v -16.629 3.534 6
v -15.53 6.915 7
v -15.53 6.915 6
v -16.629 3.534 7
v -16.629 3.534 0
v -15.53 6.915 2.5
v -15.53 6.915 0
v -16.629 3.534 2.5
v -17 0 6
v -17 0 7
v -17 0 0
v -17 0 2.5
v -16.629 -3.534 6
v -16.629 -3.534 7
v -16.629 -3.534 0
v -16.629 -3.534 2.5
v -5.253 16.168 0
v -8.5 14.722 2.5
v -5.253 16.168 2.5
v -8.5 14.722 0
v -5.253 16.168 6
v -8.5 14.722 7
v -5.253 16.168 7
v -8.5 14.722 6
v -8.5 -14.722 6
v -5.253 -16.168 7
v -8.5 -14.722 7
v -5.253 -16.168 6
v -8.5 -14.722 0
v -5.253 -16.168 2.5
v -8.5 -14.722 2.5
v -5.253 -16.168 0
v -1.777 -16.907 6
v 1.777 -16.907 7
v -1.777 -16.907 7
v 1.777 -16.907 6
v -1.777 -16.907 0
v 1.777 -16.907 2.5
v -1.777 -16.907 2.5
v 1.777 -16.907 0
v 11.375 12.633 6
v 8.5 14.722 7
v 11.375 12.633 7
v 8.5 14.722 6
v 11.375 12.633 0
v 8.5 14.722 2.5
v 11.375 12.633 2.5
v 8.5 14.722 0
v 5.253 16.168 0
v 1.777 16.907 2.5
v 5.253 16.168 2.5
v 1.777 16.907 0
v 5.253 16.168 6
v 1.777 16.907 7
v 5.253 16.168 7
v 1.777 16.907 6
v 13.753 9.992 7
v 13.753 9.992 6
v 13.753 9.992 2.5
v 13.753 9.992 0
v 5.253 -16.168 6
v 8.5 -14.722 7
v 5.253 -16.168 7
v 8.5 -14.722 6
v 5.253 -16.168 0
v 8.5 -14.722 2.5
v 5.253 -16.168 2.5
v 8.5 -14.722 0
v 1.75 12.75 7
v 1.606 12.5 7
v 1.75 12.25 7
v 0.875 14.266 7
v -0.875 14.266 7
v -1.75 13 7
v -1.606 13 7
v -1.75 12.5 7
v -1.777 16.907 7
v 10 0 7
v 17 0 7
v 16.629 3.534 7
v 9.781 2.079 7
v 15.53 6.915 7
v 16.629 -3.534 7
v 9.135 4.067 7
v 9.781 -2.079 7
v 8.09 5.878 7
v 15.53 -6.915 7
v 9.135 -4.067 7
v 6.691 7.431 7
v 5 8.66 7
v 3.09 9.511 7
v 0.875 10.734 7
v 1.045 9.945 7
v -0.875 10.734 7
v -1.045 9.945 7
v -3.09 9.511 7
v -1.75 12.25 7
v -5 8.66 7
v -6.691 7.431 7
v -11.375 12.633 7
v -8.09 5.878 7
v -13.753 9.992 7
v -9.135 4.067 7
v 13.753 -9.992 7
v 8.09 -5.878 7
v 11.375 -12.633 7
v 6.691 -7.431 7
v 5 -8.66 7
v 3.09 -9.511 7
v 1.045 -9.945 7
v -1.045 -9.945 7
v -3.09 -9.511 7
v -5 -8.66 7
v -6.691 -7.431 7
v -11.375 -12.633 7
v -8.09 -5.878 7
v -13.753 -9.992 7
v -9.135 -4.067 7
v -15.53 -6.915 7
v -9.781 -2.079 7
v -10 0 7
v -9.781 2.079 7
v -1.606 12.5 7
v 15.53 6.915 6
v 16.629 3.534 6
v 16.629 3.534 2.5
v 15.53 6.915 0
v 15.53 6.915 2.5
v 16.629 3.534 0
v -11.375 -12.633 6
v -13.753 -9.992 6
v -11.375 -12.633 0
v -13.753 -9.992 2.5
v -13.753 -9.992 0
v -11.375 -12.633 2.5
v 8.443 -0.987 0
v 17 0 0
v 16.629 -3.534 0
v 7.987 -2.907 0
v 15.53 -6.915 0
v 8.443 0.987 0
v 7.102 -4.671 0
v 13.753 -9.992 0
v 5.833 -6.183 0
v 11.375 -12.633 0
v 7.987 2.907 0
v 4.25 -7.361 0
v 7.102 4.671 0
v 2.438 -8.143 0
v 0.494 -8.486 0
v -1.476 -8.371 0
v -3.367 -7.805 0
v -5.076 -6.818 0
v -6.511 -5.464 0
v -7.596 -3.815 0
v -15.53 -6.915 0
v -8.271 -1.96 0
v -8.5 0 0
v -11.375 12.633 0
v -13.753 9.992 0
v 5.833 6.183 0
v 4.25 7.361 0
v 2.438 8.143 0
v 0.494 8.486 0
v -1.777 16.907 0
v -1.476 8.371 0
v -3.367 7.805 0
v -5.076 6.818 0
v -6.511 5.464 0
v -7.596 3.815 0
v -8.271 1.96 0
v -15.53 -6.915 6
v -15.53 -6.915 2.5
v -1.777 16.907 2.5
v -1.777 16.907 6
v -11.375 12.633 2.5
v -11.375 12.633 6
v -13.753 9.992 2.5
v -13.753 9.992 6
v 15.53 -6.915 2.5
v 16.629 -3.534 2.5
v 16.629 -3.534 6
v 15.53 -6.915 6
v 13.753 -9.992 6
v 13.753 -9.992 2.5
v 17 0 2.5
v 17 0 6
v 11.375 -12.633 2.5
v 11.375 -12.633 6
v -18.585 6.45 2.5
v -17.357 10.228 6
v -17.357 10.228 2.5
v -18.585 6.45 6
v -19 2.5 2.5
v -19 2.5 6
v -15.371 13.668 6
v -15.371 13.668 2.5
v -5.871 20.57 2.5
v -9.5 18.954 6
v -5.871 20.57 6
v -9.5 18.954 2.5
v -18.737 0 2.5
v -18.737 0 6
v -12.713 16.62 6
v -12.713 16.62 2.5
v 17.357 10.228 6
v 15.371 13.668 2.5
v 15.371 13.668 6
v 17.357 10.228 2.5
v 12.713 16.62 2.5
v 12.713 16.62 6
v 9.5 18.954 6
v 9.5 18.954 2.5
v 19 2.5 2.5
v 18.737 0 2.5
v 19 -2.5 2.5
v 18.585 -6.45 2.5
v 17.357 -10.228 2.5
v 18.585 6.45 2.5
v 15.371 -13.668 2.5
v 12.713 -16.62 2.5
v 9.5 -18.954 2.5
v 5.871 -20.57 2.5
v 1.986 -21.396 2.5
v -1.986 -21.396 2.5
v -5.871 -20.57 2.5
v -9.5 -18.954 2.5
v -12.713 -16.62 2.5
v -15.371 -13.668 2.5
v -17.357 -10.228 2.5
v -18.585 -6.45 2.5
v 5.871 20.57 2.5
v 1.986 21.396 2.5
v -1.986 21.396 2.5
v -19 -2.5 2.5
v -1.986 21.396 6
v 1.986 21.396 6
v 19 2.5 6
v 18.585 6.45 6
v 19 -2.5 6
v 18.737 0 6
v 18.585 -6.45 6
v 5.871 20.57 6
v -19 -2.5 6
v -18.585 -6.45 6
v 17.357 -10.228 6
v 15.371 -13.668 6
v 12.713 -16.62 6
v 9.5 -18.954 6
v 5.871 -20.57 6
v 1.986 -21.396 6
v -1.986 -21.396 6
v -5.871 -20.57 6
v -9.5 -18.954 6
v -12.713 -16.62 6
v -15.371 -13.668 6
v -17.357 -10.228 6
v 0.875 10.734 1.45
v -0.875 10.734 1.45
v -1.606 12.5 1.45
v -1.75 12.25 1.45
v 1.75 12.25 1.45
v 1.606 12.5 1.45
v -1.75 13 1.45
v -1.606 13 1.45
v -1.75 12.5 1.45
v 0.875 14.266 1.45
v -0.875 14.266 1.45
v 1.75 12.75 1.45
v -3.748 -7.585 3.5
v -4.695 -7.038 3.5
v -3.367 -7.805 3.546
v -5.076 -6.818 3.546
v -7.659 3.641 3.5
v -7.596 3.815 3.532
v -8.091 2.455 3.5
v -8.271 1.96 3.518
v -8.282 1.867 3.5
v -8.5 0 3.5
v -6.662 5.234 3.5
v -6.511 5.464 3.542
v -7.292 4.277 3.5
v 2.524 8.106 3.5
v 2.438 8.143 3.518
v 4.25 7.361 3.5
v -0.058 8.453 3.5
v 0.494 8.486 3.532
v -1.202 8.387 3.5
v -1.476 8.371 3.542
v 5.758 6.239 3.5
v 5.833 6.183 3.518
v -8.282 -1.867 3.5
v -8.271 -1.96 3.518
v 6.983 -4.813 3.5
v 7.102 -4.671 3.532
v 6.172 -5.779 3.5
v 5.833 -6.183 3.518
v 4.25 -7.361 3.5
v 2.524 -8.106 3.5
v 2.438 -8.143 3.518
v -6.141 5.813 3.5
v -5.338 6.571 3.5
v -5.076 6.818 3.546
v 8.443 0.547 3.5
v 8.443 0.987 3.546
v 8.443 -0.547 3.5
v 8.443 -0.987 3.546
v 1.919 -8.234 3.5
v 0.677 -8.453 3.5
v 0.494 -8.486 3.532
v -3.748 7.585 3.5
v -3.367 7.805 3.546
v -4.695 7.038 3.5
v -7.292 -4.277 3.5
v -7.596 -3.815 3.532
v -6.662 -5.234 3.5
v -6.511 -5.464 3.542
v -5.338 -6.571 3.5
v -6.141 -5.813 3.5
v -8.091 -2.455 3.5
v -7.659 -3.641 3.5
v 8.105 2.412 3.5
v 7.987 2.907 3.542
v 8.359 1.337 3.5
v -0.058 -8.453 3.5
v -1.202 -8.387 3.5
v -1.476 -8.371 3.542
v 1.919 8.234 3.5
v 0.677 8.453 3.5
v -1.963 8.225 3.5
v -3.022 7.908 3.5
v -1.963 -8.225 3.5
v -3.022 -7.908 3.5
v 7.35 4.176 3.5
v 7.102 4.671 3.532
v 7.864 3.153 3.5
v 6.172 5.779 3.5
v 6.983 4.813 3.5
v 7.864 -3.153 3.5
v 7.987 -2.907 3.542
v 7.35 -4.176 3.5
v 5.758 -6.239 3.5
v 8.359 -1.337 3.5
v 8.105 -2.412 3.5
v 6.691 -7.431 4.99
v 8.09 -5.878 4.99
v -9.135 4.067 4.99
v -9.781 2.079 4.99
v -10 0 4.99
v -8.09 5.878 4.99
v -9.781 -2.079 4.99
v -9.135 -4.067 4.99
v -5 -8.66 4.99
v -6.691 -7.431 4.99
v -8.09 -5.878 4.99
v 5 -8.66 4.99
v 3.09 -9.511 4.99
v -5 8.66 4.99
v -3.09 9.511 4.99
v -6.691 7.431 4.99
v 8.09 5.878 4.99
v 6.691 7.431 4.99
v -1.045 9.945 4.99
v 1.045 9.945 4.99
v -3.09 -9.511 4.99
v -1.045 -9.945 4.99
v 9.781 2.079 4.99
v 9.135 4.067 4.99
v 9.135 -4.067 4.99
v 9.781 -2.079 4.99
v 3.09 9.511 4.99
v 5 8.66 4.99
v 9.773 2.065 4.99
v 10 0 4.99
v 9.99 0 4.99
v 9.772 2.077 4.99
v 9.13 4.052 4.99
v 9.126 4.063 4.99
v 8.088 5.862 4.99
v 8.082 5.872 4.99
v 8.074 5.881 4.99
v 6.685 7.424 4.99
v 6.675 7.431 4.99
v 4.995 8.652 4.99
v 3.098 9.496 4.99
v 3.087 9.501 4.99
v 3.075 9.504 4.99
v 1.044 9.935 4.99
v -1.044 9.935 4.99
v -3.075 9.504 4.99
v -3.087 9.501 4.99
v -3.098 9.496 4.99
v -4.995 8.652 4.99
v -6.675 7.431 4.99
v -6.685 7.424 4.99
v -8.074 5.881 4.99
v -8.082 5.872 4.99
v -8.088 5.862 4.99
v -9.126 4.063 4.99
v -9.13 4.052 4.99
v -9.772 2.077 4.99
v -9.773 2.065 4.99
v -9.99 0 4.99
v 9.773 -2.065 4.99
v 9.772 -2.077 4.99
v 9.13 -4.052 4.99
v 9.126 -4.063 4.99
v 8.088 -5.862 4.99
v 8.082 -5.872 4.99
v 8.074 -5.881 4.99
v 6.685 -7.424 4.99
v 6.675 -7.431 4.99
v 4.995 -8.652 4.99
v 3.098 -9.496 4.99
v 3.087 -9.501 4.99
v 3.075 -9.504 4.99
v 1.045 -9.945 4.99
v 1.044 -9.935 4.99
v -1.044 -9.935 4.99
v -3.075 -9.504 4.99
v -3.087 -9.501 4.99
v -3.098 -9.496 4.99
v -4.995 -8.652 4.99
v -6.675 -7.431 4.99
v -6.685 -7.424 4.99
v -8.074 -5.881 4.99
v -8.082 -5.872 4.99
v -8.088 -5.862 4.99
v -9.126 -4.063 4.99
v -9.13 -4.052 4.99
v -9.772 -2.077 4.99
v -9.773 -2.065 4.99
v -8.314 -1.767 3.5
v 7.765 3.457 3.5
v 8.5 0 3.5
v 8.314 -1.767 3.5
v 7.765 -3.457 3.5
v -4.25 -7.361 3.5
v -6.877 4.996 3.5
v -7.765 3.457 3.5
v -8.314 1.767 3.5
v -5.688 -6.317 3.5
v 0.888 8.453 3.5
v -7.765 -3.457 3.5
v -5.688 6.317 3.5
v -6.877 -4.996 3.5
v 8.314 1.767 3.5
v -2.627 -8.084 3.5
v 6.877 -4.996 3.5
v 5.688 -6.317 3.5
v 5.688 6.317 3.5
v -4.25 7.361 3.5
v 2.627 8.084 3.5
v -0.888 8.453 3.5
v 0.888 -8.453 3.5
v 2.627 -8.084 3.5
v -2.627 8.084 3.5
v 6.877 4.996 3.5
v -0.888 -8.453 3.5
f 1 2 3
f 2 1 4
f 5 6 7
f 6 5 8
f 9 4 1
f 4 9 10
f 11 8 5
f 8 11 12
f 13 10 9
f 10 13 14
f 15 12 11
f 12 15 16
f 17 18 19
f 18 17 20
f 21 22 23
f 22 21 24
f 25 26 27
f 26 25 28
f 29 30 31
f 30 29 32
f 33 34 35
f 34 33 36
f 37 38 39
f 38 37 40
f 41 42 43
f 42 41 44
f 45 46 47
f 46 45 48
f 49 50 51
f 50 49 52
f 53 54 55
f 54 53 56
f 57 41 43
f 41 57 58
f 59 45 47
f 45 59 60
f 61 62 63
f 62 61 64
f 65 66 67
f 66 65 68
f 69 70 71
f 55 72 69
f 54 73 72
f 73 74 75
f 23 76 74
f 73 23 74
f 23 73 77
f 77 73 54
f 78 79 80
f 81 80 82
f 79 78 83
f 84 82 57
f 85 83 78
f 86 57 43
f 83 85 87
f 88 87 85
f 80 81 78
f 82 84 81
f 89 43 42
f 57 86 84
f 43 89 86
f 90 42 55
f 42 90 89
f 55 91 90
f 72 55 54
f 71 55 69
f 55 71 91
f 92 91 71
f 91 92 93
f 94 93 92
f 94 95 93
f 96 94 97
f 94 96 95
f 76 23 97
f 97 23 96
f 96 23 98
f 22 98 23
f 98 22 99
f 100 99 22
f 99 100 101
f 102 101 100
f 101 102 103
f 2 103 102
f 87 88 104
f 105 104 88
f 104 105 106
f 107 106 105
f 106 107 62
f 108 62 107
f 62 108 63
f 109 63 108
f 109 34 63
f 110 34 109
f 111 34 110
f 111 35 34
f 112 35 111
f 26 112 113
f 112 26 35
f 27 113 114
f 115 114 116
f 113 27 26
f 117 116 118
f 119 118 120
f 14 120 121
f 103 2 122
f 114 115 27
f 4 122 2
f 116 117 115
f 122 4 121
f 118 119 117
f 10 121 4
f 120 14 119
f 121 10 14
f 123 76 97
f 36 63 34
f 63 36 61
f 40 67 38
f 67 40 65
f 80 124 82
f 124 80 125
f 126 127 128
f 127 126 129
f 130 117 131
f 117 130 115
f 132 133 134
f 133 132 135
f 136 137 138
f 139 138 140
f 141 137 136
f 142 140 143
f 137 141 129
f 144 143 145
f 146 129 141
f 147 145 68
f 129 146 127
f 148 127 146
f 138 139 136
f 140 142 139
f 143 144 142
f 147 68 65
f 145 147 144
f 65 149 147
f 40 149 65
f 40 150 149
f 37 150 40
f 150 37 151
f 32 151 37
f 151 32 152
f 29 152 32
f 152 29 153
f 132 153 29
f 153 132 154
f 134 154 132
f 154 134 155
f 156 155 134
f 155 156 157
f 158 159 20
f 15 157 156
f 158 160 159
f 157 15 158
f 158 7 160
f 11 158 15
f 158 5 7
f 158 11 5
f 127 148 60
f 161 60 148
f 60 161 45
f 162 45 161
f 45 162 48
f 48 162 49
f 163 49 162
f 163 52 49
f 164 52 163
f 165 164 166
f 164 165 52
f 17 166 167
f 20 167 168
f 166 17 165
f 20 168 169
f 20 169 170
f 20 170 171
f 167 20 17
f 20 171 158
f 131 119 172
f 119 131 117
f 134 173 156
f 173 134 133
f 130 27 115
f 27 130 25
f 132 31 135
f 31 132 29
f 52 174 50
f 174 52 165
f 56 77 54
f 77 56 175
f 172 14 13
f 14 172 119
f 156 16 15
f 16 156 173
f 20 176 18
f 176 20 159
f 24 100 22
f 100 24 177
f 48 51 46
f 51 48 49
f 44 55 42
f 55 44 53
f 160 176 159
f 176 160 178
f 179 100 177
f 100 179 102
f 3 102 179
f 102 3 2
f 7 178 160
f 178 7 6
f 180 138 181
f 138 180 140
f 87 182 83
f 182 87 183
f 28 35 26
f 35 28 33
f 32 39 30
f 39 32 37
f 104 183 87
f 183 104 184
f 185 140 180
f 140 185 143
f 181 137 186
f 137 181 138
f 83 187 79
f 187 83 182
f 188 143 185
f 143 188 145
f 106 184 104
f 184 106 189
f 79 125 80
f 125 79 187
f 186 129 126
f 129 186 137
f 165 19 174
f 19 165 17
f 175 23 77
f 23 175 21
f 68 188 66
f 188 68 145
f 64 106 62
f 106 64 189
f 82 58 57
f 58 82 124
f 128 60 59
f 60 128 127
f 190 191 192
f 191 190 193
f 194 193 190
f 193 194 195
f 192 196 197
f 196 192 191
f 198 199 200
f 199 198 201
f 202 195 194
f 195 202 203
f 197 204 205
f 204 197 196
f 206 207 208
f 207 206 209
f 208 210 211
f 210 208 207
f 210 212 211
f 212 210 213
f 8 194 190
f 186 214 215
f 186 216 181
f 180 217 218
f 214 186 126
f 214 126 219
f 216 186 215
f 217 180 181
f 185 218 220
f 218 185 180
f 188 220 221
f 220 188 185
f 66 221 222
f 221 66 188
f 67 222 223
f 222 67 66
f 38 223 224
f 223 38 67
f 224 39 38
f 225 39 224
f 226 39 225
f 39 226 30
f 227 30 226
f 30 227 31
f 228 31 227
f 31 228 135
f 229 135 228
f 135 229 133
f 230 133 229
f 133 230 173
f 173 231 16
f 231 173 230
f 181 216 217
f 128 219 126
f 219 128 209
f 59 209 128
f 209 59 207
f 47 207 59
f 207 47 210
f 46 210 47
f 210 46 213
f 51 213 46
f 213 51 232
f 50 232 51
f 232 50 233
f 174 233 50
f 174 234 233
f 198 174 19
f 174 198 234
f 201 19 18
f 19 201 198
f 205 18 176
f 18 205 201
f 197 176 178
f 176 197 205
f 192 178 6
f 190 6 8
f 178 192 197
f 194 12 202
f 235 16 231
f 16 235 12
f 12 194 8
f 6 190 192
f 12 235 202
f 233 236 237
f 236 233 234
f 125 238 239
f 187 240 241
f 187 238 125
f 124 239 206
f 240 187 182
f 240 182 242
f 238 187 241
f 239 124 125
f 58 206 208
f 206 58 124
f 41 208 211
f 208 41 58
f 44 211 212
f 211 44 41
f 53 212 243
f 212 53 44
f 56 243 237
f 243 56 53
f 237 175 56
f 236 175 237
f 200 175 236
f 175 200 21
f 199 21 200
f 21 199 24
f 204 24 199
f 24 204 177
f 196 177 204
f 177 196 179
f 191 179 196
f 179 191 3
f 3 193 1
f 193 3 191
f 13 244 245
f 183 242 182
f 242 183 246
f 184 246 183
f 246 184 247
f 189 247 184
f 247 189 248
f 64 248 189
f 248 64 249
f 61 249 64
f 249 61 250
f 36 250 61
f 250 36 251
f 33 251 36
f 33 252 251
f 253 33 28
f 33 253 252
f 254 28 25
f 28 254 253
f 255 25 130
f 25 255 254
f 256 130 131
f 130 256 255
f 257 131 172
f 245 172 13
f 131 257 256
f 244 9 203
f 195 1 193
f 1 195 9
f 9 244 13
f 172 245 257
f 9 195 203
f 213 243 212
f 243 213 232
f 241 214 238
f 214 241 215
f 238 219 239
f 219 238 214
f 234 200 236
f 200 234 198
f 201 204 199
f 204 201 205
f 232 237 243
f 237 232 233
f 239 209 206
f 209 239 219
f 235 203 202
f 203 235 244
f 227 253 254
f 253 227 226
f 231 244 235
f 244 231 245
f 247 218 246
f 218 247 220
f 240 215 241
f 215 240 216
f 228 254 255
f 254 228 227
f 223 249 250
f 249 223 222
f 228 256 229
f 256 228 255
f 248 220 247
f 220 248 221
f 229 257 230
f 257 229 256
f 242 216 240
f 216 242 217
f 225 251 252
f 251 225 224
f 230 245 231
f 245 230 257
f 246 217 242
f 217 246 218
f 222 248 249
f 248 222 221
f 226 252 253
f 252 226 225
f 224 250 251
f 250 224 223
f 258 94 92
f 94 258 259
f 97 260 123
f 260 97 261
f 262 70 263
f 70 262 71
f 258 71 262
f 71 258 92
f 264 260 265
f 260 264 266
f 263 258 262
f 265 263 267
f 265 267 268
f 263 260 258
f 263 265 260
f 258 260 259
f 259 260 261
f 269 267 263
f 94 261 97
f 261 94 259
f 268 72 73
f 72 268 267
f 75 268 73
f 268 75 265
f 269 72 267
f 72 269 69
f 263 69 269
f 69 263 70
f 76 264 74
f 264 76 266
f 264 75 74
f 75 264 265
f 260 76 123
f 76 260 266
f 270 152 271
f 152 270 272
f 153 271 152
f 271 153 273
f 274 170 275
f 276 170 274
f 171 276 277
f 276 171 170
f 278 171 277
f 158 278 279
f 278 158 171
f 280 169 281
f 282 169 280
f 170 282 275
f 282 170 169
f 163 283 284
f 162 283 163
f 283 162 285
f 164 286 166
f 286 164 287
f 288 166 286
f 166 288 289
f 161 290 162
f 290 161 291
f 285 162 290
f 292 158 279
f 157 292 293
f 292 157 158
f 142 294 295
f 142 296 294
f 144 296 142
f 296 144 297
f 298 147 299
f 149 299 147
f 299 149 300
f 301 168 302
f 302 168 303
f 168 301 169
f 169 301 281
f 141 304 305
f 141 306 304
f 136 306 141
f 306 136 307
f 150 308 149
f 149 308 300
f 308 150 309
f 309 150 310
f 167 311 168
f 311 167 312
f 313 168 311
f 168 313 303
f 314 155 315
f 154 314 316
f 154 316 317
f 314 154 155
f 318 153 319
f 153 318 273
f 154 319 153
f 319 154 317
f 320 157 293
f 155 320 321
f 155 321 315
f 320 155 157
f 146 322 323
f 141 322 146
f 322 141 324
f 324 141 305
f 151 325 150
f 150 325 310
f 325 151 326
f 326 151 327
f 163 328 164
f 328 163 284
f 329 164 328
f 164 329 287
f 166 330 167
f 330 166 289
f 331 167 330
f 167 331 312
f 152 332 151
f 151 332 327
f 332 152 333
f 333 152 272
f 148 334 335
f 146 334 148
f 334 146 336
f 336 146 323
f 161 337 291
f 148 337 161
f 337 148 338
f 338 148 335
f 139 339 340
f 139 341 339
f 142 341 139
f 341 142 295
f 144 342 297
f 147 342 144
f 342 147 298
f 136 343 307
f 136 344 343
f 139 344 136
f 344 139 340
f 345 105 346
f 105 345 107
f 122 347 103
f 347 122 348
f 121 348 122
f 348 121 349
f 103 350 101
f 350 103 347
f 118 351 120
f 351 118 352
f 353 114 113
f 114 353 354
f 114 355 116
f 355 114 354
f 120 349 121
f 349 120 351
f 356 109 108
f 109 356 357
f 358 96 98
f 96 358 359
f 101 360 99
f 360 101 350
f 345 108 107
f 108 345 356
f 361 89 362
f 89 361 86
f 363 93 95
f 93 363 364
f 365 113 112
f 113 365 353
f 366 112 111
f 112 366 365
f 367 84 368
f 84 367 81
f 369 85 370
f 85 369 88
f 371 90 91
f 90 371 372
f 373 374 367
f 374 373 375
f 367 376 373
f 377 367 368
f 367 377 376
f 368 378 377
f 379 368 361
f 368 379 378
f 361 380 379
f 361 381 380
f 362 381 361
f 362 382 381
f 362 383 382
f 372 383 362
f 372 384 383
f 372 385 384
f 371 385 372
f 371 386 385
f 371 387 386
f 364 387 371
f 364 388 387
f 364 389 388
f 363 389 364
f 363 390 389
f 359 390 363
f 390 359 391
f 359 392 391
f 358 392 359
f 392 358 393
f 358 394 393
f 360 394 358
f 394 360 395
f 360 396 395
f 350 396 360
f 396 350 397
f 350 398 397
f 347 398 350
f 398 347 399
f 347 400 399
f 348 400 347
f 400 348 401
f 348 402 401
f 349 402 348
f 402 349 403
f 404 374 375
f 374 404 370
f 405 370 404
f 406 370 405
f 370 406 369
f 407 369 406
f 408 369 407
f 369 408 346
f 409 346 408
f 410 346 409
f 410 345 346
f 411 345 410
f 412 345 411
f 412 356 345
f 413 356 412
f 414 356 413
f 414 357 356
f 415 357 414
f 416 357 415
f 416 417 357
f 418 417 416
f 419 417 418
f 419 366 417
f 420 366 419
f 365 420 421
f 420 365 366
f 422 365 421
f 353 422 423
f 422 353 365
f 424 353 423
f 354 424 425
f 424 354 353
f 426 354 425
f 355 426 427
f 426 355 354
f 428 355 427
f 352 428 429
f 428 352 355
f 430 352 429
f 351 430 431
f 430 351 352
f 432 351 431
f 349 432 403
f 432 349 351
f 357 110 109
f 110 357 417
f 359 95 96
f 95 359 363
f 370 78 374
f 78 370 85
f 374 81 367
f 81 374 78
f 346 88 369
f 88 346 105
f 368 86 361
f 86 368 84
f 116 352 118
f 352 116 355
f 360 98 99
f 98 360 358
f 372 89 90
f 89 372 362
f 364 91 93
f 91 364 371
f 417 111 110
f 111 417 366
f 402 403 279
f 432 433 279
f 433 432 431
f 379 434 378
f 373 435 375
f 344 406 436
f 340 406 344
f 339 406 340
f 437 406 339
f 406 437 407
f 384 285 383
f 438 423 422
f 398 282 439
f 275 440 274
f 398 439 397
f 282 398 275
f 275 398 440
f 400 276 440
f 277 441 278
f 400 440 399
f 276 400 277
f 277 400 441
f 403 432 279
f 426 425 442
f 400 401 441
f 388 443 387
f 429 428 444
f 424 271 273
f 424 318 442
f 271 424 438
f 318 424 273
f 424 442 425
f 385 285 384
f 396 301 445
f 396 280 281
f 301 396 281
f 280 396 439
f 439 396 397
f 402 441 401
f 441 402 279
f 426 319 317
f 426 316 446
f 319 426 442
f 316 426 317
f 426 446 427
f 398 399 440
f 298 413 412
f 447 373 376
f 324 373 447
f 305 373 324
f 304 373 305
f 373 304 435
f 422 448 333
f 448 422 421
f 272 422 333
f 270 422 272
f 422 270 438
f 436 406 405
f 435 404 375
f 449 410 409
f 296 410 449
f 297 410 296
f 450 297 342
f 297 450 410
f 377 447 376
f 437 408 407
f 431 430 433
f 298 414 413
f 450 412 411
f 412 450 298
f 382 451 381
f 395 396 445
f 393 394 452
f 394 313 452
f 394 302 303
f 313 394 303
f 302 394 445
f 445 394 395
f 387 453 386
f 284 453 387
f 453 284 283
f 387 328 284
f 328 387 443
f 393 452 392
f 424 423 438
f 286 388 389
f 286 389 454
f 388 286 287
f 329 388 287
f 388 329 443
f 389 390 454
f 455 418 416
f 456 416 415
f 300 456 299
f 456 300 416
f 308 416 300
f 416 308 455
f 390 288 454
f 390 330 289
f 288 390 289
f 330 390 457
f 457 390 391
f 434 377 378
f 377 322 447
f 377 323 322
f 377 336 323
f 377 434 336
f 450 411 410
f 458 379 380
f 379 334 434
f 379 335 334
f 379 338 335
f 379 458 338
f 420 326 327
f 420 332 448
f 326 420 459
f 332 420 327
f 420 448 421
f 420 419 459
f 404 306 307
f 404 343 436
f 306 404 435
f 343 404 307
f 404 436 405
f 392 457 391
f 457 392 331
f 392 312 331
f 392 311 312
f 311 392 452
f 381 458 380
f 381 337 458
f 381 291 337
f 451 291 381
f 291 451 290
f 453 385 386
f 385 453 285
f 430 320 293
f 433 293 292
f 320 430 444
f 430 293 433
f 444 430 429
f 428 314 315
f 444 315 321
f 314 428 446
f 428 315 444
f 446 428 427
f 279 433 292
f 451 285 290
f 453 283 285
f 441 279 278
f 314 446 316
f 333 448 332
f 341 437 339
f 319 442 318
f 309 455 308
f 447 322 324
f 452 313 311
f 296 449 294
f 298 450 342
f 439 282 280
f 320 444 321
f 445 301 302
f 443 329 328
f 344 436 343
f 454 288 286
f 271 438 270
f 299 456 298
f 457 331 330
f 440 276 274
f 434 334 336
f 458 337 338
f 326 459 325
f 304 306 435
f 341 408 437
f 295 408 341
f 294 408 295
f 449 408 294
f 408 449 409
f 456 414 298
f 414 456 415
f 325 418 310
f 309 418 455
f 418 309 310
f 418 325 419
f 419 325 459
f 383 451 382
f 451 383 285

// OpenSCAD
// Rotate the disc by 180 degrees to flip it upside down, which
// makes it easier to print the hole, etc. Lift it up by 7mm to bring
// it back above the axis // (the entire body is 7mm high).
translate([0, 0, 7]) rotate(a=[0,180,0]) difference() {
	union() {
		// Big cylinder for placement inside the machine.
		cylinder(h = 7, r = 17);

		// Outer cylinder; any sewing information would go here.
		translate([0, 2.5, 1]) cylinder(h = 3.5, r = 19);
		translate([0, -2.5, 1]) cylinder(h = 3.5, r = 19);
	}

	// Subtract the inner hole. Be very generous.
	translate([0, 0, 4])
		cylinder(h = 10, r = 8.5, center=true);

	// Subtract the lower cone.
	cylinder(h = 2.01, r = 10);

	// Subtract the diagonal layer the disk rests on.
	translate([0, 0, 2])
		cylinder(h = 1.5, r1 = 10, r2 = 8.5);

	// Transport hole
	union() {
		translate([0, 12.25, -0.05])
			cylinder(h = 5.6, r=1.75);
		translate([0, 12.75, -0.05])
			cylinder(h = 5.6, r=1.75);
		translate([0, 12.5, -0.05])
			cube(size = [1.75, 0.5, 5.6]);
	}

	// Mark the 18 stitches.
	// This is where the needle is at its deepest point.
	// Only for modelling, remove before print!
//	for (z=[0 : 17]) // 18 times
//	{
//		rotate(a=[0, 0, z*20]) { 
//   		translate([0, 17, 7])
//				cylinder(h= 1, r=1, center=true);
//		}
//	}
}
